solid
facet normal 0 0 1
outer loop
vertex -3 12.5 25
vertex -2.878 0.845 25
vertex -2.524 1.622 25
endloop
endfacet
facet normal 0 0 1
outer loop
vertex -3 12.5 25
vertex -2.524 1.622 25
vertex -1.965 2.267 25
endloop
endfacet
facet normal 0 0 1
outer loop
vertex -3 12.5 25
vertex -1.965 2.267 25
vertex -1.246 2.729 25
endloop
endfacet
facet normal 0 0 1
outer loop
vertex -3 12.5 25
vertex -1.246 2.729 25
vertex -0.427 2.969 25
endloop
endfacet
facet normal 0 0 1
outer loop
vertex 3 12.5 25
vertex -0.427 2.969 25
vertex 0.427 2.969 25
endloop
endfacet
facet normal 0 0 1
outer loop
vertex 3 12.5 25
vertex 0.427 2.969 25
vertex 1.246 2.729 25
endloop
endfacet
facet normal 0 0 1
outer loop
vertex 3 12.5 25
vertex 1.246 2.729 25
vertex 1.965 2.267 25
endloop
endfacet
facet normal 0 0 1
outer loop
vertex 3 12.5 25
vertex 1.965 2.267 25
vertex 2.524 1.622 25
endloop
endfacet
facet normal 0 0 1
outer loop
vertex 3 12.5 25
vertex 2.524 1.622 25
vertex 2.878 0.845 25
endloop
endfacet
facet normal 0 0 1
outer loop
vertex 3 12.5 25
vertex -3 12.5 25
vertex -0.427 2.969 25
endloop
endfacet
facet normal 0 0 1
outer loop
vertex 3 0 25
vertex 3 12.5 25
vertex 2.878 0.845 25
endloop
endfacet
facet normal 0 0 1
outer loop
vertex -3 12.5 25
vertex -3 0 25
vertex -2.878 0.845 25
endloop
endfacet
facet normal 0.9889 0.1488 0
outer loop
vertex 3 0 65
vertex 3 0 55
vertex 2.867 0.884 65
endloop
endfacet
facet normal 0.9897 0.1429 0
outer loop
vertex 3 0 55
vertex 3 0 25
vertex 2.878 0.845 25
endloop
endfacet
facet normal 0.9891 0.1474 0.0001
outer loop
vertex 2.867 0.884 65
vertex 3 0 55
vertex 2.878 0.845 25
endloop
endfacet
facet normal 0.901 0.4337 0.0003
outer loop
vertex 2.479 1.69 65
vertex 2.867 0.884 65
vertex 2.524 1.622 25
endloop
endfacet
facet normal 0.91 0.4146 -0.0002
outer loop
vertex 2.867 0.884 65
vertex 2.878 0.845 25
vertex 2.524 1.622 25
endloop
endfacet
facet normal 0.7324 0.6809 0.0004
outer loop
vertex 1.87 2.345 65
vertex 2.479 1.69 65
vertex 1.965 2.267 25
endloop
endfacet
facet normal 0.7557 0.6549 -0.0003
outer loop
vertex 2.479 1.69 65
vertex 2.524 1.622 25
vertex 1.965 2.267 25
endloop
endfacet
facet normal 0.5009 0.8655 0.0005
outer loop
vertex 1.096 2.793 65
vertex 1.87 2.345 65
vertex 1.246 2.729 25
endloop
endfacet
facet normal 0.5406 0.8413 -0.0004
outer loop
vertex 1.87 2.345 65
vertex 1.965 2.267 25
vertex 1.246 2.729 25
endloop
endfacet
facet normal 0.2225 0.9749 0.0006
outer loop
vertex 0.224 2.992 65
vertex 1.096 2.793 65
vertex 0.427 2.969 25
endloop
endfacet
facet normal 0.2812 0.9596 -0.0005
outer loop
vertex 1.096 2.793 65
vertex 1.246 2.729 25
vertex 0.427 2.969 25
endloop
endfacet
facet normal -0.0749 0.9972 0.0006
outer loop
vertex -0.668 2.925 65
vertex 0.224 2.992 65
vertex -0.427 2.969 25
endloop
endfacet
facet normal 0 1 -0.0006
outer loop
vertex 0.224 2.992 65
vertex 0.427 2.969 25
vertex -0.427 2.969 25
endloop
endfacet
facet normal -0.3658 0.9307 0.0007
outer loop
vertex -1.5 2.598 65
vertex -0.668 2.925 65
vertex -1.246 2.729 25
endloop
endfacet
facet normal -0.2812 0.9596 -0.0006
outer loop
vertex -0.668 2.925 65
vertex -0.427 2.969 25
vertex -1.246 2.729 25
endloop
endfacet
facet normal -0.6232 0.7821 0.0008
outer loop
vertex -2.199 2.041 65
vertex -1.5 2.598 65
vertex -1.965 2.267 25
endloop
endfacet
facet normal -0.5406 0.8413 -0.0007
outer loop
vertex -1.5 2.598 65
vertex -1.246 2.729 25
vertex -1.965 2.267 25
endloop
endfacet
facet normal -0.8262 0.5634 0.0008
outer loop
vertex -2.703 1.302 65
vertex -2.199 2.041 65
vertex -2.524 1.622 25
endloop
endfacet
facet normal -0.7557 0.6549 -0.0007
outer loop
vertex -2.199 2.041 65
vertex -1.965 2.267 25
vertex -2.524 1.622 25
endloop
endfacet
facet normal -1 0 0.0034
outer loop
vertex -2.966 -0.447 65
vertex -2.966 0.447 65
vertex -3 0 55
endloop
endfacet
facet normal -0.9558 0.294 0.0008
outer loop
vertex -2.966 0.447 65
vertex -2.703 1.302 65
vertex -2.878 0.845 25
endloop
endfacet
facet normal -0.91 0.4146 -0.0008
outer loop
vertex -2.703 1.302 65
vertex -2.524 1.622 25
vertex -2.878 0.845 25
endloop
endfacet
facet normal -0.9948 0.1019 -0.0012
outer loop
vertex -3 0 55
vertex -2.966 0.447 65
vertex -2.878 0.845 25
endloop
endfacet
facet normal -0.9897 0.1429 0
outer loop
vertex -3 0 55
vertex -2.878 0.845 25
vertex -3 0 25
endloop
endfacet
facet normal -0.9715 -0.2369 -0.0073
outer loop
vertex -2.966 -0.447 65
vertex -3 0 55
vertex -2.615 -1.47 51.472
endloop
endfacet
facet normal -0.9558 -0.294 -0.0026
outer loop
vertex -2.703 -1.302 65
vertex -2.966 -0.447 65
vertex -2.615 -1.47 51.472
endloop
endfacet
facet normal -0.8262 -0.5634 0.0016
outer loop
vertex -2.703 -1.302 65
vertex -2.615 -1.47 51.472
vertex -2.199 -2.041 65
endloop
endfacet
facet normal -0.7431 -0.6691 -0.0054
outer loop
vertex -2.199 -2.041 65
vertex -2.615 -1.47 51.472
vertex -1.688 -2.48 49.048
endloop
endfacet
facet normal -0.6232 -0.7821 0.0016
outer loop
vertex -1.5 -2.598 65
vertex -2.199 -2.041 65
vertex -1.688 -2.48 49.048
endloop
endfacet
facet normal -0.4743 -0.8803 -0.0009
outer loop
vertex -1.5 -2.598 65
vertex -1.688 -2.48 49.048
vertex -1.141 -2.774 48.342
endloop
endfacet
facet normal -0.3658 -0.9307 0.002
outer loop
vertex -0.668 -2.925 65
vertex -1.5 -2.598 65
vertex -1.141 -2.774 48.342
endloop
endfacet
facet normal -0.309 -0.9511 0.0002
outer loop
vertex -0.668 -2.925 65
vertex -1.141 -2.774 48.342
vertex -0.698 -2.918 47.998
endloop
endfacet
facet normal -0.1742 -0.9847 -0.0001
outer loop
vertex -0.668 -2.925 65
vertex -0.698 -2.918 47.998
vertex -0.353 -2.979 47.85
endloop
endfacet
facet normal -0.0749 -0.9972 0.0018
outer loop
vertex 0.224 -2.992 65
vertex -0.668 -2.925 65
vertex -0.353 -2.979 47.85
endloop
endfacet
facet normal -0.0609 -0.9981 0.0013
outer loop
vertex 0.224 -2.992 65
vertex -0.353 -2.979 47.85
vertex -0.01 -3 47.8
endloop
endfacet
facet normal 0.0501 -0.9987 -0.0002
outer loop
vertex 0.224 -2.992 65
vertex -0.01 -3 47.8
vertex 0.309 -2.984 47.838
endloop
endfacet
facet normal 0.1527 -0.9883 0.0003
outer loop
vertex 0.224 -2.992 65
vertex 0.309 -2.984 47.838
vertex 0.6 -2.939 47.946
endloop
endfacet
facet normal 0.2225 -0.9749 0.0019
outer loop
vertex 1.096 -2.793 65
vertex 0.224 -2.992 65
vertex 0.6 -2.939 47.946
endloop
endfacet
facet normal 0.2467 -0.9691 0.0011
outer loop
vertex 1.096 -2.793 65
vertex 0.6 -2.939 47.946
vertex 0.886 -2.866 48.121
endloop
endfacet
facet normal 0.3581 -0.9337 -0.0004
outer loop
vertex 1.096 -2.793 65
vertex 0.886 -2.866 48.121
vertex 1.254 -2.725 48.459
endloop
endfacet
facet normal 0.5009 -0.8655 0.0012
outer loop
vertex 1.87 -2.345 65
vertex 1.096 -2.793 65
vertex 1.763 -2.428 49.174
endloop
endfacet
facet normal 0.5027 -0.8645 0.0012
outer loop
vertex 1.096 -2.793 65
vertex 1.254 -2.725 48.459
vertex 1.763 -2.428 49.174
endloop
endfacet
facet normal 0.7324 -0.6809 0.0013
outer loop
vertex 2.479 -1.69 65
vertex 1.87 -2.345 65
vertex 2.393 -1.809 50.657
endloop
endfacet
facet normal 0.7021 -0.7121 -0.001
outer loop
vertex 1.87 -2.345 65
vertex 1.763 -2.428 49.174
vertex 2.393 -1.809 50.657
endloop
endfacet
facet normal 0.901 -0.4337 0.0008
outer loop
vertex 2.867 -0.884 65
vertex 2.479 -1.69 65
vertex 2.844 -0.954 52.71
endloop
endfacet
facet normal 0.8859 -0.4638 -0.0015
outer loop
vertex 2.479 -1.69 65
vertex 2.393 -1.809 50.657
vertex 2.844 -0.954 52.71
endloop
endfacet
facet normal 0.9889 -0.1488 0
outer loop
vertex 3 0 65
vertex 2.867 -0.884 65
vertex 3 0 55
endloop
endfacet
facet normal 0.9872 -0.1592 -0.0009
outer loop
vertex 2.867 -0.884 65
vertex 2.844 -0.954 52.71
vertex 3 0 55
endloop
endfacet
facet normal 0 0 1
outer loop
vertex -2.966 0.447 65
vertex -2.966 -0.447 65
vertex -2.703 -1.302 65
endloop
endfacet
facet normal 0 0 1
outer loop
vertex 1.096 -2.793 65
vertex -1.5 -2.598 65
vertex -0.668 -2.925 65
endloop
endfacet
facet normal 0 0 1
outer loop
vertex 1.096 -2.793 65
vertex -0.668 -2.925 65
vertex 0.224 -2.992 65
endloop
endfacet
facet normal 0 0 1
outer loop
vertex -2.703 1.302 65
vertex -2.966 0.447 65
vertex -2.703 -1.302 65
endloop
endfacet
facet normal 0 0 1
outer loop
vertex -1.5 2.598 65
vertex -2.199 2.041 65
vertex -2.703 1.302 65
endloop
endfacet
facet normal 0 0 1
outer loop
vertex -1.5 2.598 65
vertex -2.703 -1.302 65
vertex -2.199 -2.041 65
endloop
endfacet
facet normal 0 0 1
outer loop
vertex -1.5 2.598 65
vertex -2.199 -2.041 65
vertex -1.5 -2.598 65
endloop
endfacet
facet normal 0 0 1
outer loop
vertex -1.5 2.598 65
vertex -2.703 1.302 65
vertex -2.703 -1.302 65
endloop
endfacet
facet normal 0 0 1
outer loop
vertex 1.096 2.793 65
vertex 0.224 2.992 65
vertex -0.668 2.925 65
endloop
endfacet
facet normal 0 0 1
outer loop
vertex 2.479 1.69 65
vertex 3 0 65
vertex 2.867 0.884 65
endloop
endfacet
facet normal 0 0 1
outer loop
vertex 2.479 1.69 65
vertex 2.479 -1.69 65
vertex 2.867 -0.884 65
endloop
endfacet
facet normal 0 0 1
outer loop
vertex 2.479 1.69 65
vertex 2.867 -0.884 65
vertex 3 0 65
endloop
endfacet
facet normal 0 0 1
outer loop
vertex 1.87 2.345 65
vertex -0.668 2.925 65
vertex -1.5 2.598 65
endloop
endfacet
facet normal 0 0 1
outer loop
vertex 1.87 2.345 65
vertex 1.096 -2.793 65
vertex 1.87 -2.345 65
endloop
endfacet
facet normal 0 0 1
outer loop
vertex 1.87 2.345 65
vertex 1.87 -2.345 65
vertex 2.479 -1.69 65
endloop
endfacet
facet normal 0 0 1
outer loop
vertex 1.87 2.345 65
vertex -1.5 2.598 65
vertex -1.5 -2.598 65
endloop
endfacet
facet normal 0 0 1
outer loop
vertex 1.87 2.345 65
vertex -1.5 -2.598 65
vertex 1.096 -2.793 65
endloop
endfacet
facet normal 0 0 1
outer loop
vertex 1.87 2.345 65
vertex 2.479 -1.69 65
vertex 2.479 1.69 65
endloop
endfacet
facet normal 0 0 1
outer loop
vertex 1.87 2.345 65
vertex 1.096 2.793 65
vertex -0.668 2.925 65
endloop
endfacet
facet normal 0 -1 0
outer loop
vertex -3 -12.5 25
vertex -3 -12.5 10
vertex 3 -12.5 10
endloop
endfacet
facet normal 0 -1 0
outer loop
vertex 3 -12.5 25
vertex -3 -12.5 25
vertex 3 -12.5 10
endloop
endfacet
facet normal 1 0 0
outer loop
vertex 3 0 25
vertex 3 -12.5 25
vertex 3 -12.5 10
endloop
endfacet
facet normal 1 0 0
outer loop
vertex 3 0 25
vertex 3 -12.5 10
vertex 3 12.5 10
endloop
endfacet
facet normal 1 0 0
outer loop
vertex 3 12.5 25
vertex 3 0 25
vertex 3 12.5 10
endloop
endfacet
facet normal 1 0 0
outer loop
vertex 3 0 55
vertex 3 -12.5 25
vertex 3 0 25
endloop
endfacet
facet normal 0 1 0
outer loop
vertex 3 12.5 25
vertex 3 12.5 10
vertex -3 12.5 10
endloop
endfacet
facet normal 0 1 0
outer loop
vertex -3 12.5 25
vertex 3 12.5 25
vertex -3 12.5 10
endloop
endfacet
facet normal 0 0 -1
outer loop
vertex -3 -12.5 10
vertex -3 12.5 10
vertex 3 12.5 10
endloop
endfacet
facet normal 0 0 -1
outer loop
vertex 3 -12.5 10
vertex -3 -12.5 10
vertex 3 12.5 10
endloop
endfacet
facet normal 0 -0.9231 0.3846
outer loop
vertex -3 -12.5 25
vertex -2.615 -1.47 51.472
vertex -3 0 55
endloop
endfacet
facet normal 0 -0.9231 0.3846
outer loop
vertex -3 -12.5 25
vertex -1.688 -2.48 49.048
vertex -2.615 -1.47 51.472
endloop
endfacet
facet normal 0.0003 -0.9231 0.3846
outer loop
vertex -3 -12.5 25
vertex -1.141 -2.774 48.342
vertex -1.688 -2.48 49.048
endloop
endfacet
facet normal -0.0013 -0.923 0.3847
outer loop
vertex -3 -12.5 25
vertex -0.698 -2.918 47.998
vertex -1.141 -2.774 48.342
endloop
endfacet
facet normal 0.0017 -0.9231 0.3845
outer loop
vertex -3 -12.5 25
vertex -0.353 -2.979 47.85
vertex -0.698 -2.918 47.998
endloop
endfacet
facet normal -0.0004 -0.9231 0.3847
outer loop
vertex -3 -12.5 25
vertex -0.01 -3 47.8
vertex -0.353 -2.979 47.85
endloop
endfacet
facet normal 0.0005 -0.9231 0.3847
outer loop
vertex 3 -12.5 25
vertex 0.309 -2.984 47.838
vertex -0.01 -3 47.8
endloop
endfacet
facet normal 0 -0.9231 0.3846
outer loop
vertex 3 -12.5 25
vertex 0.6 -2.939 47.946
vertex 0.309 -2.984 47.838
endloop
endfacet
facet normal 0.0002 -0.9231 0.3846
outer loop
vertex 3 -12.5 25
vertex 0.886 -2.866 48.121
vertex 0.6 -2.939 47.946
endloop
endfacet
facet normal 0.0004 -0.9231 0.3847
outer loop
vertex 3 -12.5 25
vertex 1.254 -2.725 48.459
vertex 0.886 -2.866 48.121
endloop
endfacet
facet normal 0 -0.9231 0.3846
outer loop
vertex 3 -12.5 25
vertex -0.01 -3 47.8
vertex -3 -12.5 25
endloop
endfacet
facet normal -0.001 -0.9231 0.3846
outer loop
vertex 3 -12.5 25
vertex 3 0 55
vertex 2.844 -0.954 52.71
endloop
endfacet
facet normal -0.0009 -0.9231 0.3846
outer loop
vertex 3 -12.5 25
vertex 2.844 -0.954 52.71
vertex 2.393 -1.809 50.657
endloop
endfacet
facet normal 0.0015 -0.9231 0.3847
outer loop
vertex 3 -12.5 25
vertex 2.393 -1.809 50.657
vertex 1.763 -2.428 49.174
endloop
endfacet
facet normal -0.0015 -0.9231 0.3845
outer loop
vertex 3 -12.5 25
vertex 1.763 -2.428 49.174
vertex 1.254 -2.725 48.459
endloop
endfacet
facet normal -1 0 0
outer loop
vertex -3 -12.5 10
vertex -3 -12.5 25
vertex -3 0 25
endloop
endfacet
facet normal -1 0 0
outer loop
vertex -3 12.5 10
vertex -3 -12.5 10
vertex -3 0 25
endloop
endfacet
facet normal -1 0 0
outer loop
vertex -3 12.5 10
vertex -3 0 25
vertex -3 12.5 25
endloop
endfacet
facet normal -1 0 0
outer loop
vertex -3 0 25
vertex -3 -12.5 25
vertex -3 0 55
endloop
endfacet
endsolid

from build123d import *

# Parameters (mm, degrees)
F1_DEPTH = 25
F2_DEPTH = 65
F4_DEPTH = 3
F5_DEPTH = 10


with BuildPart() as f1:
    # F0 (on Top) → F1 (new body)
    with BuildSketch(Plane.XY):
        with BuildLine():
            ThreePointArc((-3, 0), (0, 3), (3, 0))
            Line((3, 0), (3, 12.5))
            Line((3, 12.5), (-3, 12.5))
            Line((-3, 12.5), (-3, 0))
        make_face()
    extrude(amount=F1_DEPTH)



with BuildPart() as f1b:
    # F0 (on Top) → F1, piece 2 (new body)
    with BuildSketch(Plane.XY):
        with BuildLine():
            Line((3, -12.5), (3, 0))
            ThreePointArc((3, 0), (0, -3), (-3, 0))
            Line((-3, 0), (-3, -12.5))
            Line((-3, -12.5), (3, -12.5))
        make_face()
    extrude(amount=F1_DEPTH)


with BuildPart() as f1_1:
    add(f1.part)

    add(f1b.part)  # F2 merges F1b
    # F0 (on Top) → F2 (join)
    with BuildSketch(Plane.XY):
        with BuildLine():
            ThreePointArc((-3, 0), (0, -3), (3, 0))
            ThreePointArc((3, 0), (0, 3), (-3, 0))
        make_face()
    extrude(amount=F2_DEPTH)

    # F3 (on Right) → F4 (join, symmetric)
    with BuildSketch(Plane.YZ):
        Polygon((-12.5, 25), (0, 25), (0, 55), align=None)
    extrude(amount=F4_DEPTH, both=True)

    # F0 (on Top) → F5 (cut)
    with BuildSketch(Plane.XY):
        with BuildLine():
            ThreePointArc((-3, 0), (0, 3), (3, 0))
            Line((3, 0), (3, 12.5))
            Line((3, 12.5), (-3, 12.5))
            Line((-3, 12.5), (-3, 0))
        make_face()
        with BuildLine():
            ThreePointArc((-3, 0), (0, -3), (3, 0))
            ThreePointArc((3, 0), (0, 3), (-3, 0))
        make_face()
        with BuildLine():
            Line((3, -12.5), (3, 0))
            ThreePointArc((3, 0), (0, -3), (-3, 0))
            Line((-3, 0), (-3, -12.5))
            Line((-3, -12.5), (3, -12.5))
        make_face()
    extrude(amount=F5_DEPTH, mode=Mode.SUBTRACT)


solid = f1_1.part
